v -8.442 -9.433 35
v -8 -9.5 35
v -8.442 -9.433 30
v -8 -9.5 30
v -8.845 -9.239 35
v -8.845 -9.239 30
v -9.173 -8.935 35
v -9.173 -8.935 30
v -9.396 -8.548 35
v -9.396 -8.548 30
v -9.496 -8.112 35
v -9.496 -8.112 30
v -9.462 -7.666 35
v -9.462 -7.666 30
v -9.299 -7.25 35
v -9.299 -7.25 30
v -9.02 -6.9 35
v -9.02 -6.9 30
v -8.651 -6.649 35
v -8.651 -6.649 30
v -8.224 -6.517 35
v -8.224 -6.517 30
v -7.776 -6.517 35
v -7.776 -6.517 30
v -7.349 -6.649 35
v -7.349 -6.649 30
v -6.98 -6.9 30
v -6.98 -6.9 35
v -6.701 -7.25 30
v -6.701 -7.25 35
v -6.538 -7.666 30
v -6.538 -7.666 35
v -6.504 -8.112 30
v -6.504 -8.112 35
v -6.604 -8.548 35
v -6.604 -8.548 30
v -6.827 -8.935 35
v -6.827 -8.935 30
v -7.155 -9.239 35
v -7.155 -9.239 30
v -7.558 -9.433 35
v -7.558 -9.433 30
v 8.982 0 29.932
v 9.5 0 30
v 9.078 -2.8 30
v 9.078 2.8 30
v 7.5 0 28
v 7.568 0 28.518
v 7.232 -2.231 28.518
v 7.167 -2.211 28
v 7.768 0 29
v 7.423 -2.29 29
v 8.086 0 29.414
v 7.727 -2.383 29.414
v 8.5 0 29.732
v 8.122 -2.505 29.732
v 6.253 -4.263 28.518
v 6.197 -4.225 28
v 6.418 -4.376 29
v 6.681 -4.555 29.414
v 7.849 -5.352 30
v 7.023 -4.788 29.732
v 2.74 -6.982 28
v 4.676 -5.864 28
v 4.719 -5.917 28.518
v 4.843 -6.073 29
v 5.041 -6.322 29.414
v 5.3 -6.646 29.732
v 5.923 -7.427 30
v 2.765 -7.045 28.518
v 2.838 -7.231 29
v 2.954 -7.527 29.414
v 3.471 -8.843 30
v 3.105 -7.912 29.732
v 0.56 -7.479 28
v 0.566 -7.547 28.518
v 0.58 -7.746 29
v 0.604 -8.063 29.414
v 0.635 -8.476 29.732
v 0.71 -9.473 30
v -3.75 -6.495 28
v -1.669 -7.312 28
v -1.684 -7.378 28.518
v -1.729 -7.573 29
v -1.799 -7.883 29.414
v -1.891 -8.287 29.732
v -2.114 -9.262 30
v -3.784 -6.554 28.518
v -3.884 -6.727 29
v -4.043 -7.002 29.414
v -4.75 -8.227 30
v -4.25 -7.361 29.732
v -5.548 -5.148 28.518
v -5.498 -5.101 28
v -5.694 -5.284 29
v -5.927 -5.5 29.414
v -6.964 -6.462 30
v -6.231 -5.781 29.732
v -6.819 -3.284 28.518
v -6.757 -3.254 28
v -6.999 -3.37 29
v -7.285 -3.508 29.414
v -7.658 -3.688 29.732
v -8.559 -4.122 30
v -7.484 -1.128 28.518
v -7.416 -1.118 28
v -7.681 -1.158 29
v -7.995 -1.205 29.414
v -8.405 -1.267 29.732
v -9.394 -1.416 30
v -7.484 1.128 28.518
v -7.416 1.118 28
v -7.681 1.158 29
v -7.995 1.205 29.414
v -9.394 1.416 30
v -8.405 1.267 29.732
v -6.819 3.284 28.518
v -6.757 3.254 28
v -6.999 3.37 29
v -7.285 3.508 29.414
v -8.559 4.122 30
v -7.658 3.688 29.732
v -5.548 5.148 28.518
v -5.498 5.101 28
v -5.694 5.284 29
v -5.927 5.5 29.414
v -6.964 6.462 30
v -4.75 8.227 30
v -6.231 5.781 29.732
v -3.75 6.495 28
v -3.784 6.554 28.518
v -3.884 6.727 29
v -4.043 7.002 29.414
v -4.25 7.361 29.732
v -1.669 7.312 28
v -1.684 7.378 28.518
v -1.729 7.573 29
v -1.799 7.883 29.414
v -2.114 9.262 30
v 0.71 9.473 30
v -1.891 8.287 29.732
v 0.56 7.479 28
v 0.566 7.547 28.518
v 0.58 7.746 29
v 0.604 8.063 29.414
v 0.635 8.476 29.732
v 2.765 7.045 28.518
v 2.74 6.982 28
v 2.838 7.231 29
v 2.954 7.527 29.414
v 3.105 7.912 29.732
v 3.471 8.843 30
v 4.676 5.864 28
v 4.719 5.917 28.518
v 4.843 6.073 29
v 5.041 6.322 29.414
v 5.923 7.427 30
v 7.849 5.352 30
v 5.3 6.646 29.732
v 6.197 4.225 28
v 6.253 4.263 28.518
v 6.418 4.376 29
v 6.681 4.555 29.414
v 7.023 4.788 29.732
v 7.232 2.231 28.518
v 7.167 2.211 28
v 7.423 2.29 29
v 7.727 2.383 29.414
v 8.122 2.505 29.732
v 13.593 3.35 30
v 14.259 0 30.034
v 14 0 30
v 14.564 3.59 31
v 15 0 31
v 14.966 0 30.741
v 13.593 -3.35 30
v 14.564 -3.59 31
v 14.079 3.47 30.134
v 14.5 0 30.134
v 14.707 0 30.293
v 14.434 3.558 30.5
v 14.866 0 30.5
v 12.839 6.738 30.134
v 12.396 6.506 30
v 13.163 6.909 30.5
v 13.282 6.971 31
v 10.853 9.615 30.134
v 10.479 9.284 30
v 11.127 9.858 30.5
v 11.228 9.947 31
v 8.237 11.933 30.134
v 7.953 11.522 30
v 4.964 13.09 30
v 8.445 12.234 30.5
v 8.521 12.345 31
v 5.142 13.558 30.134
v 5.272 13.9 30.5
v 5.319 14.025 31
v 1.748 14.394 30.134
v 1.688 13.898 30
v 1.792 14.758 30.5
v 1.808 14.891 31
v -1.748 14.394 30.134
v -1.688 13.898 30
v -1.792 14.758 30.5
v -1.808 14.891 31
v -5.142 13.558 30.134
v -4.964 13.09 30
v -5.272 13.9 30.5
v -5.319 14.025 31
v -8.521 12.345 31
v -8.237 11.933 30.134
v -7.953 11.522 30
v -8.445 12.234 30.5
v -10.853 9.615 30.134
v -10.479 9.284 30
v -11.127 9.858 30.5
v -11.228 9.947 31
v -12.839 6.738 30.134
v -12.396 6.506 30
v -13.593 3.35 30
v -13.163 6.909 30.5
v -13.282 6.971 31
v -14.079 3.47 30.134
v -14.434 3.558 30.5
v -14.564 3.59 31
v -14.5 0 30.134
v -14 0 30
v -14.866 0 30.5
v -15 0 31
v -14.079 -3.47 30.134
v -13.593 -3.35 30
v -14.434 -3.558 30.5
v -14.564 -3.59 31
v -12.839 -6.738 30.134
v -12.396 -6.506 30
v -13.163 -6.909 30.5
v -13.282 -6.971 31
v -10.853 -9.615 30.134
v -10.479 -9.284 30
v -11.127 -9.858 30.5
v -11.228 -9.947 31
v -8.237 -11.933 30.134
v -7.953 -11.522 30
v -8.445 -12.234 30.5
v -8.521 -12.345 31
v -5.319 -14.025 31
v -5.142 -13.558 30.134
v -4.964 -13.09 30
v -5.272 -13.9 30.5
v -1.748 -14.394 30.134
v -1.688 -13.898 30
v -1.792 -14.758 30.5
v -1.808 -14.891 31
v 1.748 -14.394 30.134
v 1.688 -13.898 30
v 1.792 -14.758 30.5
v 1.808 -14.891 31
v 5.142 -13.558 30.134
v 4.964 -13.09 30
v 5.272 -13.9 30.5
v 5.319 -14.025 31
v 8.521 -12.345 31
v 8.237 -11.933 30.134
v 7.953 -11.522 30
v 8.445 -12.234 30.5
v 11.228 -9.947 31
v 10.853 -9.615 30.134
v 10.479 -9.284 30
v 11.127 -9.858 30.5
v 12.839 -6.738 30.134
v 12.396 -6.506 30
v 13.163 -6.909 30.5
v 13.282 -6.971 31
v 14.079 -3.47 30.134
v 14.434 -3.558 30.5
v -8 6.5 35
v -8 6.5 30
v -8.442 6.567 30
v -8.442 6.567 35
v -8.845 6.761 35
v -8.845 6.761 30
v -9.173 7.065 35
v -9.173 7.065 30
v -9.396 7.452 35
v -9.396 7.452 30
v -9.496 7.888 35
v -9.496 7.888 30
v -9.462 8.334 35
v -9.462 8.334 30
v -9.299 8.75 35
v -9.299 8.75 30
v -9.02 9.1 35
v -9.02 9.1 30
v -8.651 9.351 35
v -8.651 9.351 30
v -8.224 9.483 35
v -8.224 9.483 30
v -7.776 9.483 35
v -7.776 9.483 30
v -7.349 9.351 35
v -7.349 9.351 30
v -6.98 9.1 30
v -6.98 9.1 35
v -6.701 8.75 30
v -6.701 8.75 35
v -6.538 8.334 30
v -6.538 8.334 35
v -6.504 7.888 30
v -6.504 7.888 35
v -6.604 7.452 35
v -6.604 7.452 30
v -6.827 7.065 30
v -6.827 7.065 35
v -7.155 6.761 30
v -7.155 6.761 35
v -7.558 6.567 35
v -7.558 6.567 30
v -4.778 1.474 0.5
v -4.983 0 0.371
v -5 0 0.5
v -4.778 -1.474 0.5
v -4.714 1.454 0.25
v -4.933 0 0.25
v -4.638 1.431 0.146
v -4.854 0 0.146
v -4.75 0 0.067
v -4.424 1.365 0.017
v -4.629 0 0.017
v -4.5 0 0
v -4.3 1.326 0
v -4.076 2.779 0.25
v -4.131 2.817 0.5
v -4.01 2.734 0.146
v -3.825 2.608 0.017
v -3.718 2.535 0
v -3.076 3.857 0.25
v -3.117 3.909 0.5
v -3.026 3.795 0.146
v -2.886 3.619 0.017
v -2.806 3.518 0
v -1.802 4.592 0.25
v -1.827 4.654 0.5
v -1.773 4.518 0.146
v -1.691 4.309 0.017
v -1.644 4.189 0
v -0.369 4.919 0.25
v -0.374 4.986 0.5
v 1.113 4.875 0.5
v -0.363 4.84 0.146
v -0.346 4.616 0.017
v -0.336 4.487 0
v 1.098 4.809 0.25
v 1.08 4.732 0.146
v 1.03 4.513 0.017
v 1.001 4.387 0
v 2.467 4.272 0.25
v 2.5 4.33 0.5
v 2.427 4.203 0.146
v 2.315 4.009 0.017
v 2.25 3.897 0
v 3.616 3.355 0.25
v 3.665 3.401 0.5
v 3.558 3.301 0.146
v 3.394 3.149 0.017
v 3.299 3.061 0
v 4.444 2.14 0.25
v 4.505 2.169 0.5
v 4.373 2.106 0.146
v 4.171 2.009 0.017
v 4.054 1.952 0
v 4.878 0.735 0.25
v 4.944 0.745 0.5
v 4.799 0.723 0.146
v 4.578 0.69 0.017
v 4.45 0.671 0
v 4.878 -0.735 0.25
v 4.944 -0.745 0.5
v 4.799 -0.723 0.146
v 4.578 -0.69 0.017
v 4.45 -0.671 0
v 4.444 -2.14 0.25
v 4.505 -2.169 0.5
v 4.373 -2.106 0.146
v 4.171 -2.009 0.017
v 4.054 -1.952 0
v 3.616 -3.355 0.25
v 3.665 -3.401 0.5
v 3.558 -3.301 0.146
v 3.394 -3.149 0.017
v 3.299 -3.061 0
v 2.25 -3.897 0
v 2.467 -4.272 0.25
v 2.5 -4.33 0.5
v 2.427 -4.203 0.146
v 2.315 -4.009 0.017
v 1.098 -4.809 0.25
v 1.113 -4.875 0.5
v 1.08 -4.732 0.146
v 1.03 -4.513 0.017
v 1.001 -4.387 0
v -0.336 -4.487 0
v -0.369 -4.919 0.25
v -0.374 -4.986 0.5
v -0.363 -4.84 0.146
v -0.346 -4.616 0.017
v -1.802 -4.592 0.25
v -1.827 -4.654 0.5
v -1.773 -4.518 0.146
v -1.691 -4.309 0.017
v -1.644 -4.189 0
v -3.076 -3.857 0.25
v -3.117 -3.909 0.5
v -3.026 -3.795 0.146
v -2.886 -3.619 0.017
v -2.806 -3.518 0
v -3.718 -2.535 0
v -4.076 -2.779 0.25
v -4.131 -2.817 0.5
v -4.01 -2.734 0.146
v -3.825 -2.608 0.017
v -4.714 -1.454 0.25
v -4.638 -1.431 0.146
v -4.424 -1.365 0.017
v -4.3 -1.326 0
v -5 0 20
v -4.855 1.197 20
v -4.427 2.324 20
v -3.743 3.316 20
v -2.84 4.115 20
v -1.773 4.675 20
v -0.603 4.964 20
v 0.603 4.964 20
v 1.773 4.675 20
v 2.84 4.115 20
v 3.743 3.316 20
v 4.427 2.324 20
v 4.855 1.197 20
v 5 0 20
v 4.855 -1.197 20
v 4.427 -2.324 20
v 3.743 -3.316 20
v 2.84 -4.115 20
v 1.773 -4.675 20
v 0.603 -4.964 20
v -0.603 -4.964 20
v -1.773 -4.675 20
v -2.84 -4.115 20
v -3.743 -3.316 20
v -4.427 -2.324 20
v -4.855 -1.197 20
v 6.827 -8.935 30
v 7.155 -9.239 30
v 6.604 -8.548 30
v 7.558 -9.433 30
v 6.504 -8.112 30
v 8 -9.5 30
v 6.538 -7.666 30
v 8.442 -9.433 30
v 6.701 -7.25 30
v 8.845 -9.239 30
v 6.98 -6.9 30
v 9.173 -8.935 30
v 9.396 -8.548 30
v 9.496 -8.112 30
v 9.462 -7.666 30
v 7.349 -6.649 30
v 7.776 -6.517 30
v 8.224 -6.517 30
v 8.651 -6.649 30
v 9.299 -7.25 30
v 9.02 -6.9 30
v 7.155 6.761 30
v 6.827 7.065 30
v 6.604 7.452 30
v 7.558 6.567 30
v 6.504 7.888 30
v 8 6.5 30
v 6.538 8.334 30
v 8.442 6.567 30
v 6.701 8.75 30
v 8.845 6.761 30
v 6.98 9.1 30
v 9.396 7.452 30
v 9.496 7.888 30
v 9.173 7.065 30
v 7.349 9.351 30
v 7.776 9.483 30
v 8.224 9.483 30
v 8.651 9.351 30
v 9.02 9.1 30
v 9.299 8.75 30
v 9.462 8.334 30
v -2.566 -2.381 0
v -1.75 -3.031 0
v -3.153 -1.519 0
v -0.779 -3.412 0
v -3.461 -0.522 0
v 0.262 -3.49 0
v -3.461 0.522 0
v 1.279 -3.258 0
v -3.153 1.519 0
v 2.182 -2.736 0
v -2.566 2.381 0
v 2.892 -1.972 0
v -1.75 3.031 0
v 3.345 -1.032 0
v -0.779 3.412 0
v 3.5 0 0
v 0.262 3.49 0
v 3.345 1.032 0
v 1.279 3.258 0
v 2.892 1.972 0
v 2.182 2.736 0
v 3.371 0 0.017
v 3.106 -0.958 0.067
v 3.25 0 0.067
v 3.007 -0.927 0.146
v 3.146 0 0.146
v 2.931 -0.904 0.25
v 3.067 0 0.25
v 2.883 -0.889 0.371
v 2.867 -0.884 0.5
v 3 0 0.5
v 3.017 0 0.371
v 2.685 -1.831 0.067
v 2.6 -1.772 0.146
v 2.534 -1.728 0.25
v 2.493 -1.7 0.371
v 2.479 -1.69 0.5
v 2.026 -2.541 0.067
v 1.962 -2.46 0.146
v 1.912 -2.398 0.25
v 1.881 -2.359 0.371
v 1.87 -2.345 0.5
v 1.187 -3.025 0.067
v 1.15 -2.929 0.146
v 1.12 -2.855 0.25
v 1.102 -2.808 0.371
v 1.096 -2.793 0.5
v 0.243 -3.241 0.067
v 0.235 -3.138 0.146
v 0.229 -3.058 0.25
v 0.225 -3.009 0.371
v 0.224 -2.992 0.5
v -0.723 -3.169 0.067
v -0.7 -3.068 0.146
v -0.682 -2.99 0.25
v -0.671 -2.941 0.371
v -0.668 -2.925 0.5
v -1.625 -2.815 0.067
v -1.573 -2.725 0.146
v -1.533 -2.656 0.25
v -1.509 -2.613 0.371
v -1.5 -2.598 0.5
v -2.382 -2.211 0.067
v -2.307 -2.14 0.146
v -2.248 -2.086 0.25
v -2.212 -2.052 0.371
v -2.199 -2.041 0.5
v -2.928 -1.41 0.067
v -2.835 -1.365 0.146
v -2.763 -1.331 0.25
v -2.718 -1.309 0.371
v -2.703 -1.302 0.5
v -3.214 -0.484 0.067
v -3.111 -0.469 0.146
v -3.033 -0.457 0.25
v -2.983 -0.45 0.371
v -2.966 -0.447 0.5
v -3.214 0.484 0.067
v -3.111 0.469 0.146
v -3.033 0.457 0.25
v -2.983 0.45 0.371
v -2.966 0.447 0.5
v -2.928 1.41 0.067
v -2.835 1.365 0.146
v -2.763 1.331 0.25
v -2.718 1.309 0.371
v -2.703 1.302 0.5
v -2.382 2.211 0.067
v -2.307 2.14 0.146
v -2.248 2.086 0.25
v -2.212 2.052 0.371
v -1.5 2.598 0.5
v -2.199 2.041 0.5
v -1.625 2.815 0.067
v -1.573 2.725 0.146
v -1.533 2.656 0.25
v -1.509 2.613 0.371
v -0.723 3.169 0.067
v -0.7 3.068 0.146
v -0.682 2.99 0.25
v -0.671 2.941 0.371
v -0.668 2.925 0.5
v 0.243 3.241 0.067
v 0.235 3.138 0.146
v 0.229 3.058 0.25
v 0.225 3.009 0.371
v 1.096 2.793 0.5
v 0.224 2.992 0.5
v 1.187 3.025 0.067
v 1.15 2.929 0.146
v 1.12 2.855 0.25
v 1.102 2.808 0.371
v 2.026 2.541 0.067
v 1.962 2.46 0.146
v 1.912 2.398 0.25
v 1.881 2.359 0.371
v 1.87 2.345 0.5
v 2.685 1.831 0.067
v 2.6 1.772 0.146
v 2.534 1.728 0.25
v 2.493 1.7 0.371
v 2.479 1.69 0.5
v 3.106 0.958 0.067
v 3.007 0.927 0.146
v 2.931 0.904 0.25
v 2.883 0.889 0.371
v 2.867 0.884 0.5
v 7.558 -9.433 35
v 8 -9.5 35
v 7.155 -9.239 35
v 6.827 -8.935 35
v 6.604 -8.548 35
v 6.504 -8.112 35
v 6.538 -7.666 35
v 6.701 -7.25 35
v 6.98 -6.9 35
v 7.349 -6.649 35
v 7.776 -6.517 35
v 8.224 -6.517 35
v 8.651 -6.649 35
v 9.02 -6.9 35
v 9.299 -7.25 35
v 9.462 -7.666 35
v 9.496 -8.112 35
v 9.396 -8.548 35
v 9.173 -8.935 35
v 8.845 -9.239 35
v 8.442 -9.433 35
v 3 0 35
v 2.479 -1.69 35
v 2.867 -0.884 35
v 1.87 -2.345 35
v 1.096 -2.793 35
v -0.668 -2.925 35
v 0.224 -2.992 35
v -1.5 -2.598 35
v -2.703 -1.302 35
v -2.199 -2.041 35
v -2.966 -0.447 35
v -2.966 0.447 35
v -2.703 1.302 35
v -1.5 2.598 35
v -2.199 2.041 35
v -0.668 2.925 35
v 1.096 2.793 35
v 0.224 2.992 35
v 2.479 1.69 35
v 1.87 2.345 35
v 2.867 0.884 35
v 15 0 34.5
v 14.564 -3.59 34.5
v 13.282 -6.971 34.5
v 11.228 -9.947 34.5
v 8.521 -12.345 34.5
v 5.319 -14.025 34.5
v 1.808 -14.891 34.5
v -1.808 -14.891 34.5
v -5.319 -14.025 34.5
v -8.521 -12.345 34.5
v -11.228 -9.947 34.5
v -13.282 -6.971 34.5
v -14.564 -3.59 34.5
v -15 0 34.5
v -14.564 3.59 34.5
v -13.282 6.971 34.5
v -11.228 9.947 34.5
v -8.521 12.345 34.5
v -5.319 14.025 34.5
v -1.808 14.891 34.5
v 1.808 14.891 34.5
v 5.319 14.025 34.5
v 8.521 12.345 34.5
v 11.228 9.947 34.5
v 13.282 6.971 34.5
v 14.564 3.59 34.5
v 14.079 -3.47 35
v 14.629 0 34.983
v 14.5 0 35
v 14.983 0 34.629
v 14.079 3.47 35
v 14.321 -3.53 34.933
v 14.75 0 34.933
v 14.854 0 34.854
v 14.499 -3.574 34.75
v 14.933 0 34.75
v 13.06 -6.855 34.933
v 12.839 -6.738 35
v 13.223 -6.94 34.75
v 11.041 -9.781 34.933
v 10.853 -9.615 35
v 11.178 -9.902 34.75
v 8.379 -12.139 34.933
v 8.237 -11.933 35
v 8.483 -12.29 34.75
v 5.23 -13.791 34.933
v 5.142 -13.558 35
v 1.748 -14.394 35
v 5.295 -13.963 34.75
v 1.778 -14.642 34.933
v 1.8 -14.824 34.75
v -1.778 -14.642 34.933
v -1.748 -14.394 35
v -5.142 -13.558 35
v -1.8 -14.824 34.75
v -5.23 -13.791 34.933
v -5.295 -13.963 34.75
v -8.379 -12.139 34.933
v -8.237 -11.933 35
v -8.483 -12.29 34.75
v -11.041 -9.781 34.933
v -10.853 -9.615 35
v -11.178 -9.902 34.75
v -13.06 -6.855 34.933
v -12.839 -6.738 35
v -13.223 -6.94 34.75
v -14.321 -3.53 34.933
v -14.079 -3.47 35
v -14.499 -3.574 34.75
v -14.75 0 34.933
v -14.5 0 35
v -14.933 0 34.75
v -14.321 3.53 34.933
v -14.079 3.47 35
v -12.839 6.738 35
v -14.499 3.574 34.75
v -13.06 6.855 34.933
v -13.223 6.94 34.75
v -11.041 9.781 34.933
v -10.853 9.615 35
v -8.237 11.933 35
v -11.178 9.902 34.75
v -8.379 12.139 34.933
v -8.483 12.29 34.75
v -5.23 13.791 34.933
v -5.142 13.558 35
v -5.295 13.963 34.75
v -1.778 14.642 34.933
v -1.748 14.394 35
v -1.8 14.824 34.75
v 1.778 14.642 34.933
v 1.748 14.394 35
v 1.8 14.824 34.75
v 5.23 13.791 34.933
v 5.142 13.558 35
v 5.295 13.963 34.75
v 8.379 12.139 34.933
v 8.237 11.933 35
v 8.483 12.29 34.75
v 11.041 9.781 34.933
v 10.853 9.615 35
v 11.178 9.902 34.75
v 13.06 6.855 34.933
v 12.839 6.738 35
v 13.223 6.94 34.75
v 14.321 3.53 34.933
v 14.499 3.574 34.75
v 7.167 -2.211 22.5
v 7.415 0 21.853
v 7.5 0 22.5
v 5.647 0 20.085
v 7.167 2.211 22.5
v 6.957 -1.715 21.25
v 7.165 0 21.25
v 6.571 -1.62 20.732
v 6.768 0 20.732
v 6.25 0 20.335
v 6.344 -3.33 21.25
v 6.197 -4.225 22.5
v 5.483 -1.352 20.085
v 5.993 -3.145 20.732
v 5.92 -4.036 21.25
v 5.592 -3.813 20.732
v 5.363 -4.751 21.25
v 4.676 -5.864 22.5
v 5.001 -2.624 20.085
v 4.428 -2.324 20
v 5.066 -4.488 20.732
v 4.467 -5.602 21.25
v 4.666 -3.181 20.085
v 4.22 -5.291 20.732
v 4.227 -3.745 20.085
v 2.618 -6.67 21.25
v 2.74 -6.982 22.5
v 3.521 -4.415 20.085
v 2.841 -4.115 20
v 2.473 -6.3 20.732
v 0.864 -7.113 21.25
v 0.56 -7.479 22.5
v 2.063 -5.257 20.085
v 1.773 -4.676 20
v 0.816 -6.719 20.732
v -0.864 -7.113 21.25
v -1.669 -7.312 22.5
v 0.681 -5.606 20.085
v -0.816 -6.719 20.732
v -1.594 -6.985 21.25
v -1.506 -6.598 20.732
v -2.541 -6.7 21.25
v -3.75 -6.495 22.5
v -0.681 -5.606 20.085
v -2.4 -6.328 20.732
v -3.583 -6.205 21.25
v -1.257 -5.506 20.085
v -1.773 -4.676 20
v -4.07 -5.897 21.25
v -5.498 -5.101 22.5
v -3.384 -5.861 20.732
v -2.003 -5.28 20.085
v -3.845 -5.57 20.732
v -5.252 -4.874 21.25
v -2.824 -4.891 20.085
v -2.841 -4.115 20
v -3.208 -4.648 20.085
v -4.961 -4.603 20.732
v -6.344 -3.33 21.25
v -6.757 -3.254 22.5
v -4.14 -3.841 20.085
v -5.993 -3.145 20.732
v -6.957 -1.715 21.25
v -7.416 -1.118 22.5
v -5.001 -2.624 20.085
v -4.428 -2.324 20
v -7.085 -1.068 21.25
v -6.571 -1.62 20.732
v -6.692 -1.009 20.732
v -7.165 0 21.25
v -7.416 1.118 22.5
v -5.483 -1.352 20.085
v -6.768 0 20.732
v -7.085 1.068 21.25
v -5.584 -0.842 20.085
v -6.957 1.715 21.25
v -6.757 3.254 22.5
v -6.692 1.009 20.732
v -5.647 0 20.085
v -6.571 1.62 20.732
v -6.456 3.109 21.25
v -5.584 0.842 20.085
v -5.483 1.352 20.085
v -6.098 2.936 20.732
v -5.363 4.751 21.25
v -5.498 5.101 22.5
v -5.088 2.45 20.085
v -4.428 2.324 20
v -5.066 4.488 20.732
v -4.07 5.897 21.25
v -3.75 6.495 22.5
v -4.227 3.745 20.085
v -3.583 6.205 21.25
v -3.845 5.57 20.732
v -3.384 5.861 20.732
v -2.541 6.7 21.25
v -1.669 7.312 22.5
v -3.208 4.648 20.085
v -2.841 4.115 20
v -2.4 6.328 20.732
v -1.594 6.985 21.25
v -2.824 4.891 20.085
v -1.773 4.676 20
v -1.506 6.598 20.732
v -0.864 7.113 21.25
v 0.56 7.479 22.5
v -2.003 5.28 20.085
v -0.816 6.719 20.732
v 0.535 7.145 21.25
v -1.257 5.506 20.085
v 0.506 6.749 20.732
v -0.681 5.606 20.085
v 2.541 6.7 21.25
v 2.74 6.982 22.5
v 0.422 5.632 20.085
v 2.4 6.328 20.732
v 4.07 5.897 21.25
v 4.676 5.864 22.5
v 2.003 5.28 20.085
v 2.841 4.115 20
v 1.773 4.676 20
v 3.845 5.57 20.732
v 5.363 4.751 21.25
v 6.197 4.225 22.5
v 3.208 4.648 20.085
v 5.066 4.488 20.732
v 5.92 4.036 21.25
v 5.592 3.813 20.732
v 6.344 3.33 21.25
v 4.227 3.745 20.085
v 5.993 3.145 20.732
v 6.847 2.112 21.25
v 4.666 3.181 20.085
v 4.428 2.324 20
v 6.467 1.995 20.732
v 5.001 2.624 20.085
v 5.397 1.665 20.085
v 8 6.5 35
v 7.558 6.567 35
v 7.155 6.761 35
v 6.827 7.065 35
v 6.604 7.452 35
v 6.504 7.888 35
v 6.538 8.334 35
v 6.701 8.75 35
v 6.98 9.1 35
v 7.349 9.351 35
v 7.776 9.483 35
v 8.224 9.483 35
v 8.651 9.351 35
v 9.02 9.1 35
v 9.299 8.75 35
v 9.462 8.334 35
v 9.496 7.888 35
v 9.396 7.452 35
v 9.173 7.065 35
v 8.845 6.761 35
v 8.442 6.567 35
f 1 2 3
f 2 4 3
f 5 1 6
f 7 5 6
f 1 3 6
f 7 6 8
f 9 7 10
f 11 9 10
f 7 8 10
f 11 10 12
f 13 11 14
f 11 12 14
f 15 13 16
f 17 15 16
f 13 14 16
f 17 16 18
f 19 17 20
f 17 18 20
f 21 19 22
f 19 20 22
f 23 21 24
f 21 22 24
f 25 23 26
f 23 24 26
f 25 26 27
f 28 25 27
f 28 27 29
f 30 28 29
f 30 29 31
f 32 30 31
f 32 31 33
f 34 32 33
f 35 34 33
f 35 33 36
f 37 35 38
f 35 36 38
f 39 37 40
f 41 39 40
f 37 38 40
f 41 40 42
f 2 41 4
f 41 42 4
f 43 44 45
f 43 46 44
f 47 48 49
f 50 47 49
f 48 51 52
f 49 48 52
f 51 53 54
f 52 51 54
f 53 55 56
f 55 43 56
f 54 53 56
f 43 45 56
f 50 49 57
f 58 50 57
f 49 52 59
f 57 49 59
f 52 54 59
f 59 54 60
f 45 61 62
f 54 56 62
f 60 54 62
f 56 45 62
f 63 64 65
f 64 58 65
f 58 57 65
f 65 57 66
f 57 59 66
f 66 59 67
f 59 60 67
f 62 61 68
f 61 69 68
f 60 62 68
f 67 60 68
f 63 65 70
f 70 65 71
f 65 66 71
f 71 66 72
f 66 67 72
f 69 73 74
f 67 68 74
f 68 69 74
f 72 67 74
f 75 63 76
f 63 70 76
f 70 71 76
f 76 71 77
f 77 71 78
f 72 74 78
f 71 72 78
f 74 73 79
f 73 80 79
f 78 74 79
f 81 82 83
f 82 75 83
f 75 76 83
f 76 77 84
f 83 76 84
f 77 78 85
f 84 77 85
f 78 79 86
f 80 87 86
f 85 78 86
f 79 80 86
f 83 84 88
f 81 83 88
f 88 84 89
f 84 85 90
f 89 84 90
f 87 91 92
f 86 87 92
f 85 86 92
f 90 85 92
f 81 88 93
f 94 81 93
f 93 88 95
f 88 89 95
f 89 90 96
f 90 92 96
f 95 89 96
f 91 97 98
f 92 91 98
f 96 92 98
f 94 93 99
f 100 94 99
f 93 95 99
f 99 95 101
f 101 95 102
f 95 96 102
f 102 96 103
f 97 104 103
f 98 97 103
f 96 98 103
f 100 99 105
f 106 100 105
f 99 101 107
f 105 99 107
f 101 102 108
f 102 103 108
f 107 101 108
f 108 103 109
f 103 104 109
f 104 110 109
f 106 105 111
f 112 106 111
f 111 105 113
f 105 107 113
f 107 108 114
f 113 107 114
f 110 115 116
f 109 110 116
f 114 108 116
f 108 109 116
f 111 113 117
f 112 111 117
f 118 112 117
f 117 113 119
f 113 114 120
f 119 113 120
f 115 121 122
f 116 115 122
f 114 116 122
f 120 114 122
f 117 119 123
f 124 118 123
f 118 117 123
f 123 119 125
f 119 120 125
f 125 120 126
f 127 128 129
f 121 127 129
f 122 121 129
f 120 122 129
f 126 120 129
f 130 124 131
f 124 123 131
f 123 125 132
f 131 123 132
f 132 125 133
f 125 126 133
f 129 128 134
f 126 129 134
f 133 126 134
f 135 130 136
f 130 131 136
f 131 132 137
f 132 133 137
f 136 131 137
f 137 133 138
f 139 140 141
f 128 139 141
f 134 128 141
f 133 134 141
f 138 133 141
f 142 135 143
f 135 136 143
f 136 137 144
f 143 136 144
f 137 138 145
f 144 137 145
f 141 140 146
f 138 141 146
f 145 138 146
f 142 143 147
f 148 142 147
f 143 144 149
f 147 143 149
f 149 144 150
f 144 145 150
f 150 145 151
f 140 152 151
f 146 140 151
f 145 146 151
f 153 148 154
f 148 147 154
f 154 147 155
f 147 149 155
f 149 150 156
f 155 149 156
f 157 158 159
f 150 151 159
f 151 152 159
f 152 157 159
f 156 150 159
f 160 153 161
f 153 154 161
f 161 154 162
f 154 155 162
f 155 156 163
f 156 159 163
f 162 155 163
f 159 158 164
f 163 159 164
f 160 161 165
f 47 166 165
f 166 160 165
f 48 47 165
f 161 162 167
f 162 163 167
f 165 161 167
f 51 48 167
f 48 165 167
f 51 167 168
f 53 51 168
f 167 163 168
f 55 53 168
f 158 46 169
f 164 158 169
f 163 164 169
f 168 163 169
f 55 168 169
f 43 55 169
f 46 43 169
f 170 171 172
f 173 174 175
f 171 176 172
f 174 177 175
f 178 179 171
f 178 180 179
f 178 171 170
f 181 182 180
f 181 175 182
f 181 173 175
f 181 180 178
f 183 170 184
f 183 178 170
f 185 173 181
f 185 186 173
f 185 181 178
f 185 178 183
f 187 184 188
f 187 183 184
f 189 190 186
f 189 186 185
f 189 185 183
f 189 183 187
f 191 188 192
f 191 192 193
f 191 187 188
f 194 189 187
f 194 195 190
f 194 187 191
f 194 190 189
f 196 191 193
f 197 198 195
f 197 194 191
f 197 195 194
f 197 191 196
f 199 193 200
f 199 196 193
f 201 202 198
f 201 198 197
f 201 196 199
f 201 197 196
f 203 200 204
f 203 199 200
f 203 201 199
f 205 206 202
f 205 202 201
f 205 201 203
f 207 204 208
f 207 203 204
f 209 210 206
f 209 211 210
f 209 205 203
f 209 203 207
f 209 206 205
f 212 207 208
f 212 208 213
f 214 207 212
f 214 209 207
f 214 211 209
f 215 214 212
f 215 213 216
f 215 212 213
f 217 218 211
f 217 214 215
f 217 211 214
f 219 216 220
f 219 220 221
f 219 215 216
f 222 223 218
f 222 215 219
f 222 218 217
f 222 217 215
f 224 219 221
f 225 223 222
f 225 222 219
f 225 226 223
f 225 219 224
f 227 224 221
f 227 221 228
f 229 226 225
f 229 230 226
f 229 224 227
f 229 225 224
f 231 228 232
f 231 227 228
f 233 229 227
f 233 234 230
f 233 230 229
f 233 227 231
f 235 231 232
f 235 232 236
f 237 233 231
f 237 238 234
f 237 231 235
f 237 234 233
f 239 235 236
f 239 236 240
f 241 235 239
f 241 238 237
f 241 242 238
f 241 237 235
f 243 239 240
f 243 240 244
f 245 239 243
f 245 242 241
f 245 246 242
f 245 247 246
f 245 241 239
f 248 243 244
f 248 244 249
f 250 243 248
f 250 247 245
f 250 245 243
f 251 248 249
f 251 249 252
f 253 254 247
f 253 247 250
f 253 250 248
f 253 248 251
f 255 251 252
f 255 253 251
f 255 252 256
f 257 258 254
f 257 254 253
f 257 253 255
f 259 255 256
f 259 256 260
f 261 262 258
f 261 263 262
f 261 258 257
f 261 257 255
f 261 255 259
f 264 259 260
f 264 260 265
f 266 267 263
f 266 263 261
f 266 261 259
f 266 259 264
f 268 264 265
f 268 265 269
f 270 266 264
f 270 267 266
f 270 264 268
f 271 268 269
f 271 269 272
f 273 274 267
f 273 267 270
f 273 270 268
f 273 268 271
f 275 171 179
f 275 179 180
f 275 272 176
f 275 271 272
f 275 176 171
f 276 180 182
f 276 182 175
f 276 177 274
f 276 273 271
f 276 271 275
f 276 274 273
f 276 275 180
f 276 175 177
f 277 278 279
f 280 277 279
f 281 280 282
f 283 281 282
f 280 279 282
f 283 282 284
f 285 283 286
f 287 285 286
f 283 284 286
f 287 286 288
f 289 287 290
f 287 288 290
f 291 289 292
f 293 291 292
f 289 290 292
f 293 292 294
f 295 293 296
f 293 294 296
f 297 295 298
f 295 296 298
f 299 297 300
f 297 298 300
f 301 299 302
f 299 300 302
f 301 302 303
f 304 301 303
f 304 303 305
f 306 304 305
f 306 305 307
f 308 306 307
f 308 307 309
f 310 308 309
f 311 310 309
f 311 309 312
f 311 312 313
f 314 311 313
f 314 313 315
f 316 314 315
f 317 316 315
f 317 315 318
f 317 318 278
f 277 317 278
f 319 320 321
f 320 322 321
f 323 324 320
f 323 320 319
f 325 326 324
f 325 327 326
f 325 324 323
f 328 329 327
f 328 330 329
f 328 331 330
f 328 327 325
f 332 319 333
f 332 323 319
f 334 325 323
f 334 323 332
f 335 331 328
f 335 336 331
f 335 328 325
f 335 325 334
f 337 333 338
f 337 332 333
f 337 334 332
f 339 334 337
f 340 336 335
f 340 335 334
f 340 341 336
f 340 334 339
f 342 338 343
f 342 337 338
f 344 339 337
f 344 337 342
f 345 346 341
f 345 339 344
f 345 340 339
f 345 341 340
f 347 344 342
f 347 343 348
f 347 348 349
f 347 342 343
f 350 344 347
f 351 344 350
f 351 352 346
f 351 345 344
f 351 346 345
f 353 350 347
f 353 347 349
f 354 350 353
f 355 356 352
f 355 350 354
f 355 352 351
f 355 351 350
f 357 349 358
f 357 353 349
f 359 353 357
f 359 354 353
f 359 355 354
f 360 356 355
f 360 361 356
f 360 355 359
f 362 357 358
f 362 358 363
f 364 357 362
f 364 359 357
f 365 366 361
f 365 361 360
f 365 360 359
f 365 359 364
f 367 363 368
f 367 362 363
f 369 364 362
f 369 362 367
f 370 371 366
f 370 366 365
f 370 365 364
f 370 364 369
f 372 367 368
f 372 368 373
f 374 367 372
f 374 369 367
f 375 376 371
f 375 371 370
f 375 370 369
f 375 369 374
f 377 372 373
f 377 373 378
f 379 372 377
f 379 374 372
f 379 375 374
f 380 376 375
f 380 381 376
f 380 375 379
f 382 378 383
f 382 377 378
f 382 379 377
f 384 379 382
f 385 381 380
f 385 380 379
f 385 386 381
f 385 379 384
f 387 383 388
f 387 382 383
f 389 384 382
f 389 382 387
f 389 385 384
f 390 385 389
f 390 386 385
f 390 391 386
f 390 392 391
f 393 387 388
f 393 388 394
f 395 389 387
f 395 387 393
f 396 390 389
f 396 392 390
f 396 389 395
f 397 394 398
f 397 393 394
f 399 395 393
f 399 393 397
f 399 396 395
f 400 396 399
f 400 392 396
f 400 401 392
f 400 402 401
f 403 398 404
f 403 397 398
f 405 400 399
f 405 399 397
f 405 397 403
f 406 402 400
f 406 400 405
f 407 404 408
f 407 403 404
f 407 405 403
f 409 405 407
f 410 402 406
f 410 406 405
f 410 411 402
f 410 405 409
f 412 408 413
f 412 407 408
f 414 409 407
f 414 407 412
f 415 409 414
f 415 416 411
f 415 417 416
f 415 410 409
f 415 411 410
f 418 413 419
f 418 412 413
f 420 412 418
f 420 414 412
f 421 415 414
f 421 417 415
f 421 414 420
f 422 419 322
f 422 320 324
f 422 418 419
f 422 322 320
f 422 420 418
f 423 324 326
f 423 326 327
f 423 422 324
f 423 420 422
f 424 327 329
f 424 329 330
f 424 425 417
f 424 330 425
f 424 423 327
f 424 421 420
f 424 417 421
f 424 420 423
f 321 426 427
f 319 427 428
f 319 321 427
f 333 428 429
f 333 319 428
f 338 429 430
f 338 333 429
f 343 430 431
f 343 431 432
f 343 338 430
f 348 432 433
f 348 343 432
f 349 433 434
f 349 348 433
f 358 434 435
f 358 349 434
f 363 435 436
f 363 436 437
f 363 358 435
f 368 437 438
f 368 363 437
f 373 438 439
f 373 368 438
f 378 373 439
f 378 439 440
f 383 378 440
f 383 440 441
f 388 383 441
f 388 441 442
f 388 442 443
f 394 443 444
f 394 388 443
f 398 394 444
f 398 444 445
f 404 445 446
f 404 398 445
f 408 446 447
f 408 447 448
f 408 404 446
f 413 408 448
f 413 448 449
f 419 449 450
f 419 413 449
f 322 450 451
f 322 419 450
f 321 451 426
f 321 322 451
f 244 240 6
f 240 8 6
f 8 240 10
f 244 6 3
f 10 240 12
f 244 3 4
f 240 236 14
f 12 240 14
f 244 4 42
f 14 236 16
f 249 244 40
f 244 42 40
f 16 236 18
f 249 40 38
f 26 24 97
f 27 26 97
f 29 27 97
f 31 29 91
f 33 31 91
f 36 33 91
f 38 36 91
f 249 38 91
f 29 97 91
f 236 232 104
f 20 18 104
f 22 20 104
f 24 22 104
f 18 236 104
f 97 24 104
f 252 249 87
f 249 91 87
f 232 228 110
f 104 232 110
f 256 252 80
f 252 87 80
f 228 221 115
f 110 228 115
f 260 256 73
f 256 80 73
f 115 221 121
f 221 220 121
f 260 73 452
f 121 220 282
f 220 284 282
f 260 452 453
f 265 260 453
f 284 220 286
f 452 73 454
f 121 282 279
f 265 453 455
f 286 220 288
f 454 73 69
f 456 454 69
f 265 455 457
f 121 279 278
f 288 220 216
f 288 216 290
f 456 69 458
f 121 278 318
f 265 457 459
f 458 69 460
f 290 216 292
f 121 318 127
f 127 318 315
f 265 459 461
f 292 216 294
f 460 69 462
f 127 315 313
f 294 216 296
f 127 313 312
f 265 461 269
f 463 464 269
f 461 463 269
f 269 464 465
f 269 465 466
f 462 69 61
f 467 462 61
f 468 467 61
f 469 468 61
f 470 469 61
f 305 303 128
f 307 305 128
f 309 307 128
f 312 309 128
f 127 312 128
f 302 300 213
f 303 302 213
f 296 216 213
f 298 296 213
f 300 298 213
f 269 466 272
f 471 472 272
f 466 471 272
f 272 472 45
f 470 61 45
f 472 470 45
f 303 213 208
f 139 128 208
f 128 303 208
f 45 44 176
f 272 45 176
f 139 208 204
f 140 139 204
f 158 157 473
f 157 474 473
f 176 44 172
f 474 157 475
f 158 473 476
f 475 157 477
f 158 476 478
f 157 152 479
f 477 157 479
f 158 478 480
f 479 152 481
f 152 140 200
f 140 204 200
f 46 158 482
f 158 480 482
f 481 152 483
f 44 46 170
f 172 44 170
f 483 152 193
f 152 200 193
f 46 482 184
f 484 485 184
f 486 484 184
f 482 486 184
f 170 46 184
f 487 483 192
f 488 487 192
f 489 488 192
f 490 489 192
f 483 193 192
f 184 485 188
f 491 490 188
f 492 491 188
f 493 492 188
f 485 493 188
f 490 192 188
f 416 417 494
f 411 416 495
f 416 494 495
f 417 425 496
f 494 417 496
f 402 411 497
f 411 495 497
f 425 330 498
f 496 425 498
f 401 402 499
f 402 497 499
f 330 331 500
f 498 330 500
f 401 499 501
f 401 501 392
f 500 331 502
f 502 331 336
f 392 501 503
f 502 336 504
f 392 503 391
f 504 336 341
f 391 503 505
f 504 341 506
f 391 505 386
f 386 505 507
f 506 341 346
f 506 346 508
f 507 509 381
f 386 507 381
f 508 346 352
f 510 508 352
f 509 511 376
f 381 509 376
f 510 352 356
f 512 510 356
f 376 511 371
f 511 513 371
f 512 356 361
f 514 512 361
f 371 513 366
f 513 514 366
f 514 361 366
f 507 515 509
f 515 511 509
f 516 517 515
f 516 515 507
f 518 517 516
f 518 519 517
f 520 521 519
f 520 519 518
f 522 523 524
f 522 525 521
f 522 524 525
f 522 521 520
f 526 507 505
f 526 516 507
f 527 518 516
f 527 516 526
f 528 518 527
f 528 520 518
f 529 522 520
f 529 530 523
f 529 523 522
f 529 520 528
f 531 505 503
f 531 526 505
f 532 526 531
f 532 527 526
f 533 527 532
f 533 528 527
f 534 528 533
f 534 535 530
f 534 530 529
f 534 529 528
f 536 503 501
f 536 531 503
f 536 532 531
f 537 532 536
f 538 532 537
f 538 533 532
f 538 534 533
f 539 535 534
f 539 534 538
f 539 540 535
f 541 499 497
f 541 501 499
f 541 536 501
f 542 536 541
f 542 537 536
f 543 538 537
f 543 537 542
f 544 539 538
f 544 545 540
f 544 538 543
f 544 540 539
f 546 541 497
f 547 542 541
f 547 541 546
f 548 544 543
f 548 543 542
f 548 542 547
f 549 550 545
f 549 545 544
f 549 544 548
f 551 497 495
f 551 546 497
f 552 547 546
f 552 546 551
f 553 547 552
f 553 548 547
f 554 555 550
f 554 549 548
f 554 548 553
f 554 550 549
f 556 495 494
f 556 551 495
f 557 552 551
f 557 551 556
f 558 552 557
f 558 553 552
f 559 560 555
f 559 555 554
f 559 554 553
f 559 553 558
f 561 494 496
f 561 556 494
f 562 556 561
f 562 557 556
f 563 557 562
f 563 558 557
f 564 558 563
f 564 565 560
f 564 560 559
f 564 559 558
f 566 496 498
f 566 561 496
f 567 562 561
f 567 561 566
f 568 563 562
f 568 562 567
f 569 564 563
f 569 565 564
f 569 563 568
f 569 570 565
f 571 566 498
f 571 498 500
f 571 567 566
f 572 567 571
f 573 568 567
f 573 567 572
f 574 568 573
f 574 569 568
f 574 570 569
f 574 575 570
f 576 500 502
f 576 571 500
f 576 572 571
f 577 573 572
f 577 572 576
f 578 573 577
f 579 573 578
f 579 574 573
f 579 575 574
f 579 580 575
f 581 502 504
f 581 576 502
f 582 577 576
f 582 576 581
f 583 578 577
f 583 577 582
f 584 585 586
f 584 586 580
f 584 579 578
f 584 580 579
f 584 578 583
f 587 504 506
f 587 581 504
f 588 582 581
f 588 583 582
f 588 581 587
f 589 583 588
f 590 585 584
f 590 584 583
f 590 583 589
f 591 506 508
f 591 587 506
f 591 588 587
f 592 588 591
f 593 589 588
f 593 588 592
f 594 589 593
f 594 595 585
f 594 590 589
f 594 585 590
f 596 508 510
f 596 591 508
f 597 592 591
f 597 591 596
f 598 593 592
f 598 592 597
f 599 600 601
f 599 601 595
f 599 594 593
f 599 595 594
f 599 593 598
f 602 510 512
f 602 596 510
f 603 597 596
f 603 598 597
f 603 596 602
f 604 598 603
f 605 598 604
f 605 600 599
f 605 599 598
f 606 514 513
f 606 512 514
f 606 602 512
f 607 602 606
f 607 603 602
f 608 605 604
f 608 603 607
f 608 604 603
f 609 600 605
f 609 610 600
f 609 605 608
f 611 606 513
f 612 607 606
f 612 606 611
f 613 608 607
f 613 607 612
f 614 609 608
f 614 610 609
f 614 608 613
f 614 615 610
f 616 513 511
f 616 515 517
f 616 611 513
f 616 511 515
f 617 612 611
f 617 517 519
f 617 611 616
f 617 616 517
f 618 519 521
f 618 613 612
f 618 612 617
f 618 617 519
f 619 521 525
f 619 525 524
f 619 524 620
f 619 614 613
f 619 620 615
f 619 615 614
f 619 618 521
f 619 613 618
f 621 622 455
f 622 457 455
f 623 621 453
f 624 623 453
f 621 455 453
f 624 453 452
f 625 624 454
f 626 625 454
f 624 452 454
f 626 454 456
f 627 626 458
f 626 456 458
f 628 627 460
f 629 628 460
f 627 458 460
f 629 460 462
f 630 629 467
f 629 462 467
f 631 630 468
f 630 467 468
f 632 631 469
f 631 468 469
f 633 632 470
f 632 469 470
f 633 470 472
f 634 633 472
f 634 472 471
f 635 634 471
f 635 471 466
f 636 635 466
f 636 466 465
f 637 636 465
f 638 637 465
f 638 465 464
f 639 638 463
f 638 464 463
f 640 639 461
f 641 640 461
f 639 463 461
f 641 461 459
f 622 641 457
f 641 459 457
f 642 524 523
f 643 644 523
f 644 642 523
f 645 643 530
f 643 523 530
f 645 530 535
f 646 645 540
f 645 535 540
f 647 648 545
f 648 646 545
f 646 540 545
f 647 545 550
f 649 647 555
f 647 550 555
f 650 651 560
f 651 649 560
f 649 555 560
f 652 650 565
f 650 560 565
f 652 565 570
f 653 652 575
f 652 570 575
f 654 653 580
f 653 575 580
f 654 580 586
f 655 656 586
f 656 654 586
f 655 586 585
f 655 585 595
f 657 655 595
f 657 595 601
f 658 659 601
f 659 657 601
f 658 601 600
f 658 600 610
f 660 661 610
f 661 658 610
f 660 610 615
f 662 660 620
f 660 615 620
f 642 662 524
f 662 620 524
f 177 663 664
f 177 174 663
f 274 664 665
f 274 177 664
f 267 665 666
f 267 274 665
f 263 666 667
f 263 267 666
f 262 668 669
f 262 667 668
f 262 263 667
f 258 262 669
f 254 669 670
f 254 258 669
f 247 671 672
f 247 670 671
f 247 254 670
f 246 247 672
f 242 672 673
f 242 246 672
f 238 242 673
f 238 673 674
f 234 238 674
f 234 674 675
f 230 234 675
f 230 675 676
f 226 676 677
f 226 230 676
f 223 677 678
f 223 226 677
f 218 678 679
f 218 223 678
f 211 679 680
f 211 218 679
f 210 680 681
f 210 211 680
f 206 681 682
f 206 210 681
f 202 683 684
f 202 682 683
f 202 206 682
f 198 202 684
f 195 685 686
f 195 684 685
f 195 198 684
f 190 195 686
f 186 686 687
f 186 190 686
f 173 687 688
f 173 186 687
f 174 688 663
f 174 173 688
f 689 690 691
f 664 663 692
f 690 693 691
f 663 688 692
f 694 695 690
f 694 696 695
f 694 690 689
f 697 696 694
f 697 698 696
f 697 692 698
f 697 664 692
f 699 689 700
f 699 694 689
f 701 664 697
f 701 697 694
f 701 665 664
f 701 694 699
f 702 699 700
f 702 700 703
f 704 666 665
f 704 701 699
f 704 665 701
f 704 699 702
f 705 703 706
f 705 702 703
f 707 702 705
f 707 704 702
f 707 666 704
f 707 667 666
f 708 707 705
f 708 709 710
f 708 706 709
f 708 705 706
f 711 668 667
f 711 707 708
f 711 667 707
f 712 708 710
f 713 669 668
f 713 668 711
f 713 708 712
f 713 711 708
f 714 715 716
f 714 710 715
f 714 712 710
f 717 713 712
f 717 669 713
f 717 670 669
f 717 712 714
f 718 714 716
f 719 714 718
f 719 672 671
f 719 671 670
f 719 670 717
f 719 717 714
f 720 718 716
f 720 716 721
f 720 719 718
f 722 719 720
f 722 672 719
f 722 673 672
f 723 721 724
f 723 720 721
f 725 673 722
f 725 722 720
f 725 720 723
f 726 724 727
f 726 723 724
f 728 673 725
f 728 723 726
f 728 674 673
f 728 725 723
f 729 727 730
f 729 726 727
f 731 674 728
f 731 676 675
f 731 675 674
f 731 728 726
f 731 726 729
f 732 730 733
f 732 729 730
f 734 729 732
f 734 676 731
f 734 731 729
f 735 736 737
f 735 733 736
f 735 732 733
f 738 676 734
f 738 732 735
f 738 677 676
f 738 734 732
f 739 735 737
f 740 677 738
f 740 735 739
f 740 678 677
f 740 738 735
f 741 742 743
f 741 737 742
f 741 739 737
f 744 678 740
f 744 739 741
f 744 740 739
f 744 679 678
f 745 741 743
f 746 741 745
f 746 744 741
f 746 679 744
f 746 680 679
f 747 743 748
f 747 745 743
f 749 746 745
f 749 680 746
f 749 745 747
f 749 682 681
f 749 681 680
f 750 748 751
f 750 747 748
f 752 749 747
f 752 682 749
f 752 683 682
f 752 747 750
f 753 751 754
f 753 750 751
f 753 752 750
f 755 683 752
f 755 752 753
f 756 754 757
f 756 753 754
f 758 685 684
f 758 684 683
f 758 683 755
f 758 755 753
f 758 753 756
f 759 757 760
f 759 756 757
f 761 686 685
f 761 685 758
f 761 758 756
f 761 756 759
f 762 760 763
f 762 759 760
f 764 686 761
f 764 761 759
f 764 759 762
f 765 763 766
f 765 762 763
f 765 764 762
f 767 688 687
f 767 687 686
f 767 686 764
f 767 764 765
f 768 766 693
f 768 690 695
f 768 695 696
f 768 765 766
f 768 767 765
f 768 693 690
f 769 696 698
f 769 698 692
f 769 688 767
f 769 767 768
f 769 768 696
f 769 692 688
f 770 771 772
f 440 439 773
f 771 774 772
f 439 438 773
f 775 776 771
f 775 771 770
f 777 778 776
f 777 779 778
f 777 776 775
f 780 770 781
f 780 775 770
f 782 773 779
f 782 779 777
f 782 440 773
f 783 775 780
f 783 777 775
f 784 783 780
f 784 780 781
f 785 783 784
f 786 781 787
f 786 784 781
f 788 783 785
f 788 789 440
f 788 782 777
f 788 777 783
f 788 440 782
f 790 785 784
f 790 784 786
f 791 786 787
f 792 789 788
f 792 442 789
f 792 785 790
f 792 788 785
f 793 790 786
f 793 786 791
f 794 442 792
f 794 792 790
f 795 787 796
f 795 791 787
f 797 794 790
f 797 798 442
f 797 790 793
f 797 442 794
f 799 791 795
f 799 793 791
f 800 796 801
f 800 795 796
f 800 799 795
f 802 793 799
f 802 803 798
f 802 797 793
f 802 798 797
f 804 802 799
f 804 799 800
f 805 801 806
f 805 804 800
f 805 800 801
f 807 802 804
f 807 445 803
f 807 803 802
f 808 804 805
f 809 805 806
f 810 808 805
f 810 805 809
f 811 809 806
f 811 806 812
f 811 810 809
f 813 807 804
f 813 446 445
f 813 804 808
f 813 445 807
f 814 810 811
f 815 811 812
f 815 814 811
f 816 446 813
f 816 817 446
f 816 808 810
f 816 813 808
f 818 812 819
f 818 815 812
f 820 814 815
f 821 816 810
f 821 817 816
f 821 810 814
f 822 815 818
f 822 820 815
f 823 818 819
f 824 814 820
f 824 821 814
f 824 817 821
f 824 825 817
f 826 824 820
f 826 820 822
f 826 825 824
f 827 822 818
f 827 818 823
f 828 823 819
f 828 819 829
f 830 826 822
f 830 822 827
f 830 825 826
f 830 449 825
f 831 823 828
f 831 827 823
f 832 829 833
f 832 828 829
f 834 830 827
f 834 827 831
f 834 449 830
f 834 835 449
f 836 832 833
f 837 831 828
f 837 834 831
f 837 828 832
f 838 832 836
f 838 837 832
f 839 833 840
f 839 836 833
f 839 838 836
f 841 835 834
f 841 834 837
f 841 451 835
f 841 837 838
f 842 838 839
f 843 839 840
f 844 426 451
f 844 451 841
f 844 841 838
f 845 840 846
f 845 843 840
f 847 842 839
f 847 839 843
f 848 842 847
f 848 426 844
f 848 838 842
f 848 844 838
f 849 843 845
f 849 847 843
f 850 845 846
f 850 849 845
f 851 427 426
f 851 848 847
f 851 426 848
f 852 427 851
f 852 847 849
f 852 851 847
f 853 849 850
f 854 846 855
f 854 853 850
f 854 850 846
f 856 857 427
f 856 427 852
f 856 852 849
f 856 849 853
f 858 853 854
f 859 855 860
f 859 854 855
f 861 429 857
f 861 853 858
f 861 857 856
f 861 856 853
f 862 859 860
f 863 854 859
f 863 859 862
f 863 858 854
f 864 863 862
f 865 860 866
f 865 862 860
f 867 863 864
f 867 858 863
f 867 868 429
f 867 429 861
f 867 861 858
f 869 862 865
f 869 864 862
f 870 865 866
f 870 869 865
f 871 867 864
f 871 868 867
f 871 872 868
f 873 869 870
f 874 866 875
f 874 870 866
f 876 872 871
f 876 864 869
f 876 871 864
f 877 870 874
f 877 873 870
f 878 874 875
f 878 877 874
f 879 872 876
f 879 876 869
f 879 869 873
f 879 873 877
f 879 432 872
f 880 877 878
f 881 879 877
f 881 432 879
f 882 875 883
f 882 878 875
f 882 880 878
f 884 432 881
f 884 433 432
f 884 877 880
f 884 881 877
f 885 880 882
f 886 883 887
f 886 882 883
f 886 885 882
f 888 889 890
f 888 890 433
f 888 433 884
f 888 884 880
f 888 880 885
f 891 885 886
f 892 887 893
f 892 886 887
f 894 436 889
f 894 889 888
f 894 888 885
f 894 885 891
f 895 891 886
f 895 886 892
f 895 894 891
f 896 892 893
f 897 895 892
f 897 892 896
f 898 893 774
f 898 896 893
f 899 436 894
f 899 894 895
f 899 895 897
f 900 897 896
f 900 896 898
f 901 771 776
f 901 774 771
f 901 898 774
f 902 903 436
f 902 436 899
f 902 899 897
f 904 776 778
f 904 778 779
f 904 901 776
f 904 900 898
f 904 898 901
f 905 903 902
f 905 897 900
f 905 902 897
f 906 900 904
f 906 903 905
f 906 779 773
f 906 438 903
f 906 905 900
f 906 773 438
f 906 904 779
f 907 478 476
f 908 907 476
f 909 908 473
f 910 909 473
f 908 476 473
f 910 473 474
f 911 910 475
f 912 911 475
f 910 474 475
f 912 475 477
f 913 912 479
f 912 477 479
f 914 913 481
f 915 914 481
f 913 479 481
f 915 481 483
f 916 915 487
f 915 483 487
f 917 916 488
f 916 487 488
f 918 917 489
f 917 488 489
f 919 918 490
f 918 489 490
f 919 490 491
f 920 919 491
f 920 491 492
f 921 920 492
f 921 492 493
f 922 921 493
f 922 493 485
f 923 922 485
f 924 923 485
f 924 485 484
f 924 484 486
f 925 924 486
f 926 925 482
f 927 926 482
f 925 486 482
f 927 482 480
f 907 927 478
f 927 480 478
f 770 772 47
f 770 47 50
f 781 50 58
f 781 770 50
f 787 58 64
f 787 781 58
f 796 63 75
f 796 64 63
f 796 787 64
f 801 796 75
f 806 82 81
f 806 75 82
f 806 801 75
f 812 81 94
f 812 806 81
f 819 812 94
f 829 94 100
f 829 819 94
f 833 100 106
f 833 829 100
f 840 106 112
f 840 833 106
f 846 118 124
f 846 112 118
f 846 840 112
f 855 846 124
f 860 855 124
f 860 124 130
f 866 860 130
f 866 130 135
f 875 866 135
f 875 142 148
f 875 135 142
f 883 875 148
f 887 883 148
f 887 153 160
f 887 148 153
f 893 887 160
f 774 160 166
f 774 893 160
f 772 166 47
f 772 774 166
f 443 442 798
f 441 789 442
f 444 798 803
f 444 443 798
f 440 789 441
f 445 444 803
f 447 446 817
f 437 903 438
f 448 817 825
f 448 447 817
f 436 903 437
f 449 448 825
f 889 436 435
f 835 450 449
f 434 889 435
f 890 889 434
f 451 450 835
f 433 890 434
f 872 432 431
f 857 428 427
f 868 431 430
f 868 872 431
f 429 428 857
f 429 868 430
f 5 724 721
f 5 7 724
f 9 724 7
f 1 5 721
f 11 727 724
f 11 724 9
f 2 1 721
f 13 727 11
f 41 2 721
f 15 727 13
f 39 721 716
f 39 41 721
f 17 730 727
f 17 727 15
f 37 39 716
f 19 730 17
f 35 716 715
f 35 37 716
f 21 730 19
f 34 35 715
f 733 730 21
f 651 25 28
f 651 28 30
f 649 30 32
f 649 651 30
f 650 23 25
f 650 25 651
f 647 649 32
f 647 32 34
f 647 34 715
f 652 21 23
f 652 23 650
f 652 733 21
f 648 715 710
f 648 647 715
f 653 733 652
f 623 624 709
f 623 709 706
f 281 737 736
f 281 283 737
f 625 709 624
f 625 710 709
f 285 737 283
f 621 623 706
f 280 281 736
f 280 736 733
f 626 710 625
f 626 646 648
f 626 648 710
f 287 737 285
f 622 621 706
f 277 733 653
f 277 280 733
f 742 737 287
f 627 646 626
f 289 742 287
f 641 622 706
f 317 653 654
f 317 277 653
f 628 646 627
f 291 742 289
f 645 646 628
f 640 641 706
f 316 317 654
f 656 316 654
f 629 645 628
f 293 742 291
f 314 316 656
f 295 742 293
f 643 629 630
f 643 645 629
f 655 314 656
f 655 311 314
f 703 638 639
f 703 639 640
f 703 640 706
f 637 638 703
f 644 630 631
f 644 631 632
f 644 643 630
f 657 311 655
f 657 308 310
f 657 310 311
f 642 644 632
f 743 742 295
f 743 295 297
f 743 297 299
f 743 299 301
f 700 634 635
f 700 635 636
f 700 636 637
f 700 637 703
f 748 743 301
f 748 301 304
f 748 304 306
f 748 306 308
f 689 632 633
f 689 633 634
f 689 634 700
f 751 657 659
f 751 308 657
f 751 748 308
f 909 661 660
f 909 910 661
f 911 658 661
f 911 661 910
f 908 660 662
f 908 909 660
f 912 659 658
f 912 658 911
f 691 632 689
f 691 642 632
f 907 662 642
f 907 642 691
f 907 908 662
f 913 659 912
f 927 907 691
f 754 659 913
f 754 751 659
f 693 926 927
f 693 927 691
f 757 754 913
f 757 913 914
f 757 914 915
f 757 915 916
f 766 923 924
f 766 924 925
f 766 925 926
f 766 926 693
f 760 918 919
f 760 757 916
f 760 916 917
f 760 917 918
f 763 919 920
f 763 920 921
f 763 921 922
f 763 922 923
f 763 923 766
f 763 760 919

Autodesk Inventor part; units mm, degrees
ref_plane "YZ Plane" through (0, 0, 0) normal (1, 0, 0) x (0, 1, 0)
ref_plane "XZ Plane" through (0, 0, 0) normal (0, 1, 0) x (-1, 0, 0)
ref_plane "XY Plane" through (0, 0, 0) normal (0, 0, 1) x (1, 0, 0)
sketch "スケッチ1" plane through (0, 0, 0) normal (0, 0, 1) x (1, 0, 0)
  circle A0 centre (0, 0) radius 7.5
  circle A1 centre (0, 0) radius 3
  dimension "d0" = 15
  dimension "d1" = 6
extrude "押し出し1" add sketch "スケッチ1" along normal blind 30
sketch "スケッチ2" plane through (0, 0, 30) normal (0, 0, 1) x (1, 0, 0)
  circle A0 centre (0, 0) radius 3
  circle A1 centre (0, 0) radius 15
  dimension "d4" = 6
  dimension "d5" = 30
extrude "押し出し2" add sketch "スケッチ2" along normal blind 5
sketch "スケッチ3" plane through (0, 0, 35) normal (0, 0, 1) x (1, 0, 0)
  line L0 (0, 0) -> (8, 0)
  line L1 (8, 0) -> (8, -8)
  line L2 (8, -8) -> (0, -8)
  line L3 (0, -8) -> (0, 0)
  line L4 (8, -8) -> (-8, -8)
  line L5 (-8, -8) -> (-8, 8)
  line L6 (-8, 8) -> (8, 8)
  line L7 (8, 8) -> (8, -8)
  dimension "d8" = 8
  dimension "d9" = 8
  dimension "d10" = 16
  dimension "d11" = 16
hole "穴1" at (-8, 8, 35) at (8, 8, 35) at (8, -8, 35) at (-8, -8, 35) direction (0, 0, -1) diameter 3 end through all
fillet "フィレット1" radius 2 1 edges at (-7.5, 0, 30)
fillet "フィレット3" radius 1 1 edges at (-15, 0, 30)
sketch "スケッチ4" plane through (0, 0, 0) normal (0, 0, -1) x (-1, 0, 0)
  circle A0 centre (0, 0) radius 3 projected
  circle A1 centre (0, 0) radius 7.5
  circle A2 centre (0, 0) radius 3
  circle A3 centre (0, 0) radius 5
  dimension "d22" = 6
  dimension "d23" = 15
  dimension "d24" = 10
extrude "押し出し3" cut sketch "スケッチ4" against normal blind 20 contours A1
fillet "フィレット4" radius 2.5 1 edges at (-7.5, 0, 20)
fillet "フィレット5" radius 0.5 2 edges at (5, 0, 0) (-3, 0, 0)
fillet "フィレット6" radius 0.5 1 edges at (-15, 0, 35)
equation "\"d9\" = d8"
equation "\"d10\" = 2 * d9"
equation "\"d11\" = d10"
properties part number "フランジ" material "アルミニウム 6061"
